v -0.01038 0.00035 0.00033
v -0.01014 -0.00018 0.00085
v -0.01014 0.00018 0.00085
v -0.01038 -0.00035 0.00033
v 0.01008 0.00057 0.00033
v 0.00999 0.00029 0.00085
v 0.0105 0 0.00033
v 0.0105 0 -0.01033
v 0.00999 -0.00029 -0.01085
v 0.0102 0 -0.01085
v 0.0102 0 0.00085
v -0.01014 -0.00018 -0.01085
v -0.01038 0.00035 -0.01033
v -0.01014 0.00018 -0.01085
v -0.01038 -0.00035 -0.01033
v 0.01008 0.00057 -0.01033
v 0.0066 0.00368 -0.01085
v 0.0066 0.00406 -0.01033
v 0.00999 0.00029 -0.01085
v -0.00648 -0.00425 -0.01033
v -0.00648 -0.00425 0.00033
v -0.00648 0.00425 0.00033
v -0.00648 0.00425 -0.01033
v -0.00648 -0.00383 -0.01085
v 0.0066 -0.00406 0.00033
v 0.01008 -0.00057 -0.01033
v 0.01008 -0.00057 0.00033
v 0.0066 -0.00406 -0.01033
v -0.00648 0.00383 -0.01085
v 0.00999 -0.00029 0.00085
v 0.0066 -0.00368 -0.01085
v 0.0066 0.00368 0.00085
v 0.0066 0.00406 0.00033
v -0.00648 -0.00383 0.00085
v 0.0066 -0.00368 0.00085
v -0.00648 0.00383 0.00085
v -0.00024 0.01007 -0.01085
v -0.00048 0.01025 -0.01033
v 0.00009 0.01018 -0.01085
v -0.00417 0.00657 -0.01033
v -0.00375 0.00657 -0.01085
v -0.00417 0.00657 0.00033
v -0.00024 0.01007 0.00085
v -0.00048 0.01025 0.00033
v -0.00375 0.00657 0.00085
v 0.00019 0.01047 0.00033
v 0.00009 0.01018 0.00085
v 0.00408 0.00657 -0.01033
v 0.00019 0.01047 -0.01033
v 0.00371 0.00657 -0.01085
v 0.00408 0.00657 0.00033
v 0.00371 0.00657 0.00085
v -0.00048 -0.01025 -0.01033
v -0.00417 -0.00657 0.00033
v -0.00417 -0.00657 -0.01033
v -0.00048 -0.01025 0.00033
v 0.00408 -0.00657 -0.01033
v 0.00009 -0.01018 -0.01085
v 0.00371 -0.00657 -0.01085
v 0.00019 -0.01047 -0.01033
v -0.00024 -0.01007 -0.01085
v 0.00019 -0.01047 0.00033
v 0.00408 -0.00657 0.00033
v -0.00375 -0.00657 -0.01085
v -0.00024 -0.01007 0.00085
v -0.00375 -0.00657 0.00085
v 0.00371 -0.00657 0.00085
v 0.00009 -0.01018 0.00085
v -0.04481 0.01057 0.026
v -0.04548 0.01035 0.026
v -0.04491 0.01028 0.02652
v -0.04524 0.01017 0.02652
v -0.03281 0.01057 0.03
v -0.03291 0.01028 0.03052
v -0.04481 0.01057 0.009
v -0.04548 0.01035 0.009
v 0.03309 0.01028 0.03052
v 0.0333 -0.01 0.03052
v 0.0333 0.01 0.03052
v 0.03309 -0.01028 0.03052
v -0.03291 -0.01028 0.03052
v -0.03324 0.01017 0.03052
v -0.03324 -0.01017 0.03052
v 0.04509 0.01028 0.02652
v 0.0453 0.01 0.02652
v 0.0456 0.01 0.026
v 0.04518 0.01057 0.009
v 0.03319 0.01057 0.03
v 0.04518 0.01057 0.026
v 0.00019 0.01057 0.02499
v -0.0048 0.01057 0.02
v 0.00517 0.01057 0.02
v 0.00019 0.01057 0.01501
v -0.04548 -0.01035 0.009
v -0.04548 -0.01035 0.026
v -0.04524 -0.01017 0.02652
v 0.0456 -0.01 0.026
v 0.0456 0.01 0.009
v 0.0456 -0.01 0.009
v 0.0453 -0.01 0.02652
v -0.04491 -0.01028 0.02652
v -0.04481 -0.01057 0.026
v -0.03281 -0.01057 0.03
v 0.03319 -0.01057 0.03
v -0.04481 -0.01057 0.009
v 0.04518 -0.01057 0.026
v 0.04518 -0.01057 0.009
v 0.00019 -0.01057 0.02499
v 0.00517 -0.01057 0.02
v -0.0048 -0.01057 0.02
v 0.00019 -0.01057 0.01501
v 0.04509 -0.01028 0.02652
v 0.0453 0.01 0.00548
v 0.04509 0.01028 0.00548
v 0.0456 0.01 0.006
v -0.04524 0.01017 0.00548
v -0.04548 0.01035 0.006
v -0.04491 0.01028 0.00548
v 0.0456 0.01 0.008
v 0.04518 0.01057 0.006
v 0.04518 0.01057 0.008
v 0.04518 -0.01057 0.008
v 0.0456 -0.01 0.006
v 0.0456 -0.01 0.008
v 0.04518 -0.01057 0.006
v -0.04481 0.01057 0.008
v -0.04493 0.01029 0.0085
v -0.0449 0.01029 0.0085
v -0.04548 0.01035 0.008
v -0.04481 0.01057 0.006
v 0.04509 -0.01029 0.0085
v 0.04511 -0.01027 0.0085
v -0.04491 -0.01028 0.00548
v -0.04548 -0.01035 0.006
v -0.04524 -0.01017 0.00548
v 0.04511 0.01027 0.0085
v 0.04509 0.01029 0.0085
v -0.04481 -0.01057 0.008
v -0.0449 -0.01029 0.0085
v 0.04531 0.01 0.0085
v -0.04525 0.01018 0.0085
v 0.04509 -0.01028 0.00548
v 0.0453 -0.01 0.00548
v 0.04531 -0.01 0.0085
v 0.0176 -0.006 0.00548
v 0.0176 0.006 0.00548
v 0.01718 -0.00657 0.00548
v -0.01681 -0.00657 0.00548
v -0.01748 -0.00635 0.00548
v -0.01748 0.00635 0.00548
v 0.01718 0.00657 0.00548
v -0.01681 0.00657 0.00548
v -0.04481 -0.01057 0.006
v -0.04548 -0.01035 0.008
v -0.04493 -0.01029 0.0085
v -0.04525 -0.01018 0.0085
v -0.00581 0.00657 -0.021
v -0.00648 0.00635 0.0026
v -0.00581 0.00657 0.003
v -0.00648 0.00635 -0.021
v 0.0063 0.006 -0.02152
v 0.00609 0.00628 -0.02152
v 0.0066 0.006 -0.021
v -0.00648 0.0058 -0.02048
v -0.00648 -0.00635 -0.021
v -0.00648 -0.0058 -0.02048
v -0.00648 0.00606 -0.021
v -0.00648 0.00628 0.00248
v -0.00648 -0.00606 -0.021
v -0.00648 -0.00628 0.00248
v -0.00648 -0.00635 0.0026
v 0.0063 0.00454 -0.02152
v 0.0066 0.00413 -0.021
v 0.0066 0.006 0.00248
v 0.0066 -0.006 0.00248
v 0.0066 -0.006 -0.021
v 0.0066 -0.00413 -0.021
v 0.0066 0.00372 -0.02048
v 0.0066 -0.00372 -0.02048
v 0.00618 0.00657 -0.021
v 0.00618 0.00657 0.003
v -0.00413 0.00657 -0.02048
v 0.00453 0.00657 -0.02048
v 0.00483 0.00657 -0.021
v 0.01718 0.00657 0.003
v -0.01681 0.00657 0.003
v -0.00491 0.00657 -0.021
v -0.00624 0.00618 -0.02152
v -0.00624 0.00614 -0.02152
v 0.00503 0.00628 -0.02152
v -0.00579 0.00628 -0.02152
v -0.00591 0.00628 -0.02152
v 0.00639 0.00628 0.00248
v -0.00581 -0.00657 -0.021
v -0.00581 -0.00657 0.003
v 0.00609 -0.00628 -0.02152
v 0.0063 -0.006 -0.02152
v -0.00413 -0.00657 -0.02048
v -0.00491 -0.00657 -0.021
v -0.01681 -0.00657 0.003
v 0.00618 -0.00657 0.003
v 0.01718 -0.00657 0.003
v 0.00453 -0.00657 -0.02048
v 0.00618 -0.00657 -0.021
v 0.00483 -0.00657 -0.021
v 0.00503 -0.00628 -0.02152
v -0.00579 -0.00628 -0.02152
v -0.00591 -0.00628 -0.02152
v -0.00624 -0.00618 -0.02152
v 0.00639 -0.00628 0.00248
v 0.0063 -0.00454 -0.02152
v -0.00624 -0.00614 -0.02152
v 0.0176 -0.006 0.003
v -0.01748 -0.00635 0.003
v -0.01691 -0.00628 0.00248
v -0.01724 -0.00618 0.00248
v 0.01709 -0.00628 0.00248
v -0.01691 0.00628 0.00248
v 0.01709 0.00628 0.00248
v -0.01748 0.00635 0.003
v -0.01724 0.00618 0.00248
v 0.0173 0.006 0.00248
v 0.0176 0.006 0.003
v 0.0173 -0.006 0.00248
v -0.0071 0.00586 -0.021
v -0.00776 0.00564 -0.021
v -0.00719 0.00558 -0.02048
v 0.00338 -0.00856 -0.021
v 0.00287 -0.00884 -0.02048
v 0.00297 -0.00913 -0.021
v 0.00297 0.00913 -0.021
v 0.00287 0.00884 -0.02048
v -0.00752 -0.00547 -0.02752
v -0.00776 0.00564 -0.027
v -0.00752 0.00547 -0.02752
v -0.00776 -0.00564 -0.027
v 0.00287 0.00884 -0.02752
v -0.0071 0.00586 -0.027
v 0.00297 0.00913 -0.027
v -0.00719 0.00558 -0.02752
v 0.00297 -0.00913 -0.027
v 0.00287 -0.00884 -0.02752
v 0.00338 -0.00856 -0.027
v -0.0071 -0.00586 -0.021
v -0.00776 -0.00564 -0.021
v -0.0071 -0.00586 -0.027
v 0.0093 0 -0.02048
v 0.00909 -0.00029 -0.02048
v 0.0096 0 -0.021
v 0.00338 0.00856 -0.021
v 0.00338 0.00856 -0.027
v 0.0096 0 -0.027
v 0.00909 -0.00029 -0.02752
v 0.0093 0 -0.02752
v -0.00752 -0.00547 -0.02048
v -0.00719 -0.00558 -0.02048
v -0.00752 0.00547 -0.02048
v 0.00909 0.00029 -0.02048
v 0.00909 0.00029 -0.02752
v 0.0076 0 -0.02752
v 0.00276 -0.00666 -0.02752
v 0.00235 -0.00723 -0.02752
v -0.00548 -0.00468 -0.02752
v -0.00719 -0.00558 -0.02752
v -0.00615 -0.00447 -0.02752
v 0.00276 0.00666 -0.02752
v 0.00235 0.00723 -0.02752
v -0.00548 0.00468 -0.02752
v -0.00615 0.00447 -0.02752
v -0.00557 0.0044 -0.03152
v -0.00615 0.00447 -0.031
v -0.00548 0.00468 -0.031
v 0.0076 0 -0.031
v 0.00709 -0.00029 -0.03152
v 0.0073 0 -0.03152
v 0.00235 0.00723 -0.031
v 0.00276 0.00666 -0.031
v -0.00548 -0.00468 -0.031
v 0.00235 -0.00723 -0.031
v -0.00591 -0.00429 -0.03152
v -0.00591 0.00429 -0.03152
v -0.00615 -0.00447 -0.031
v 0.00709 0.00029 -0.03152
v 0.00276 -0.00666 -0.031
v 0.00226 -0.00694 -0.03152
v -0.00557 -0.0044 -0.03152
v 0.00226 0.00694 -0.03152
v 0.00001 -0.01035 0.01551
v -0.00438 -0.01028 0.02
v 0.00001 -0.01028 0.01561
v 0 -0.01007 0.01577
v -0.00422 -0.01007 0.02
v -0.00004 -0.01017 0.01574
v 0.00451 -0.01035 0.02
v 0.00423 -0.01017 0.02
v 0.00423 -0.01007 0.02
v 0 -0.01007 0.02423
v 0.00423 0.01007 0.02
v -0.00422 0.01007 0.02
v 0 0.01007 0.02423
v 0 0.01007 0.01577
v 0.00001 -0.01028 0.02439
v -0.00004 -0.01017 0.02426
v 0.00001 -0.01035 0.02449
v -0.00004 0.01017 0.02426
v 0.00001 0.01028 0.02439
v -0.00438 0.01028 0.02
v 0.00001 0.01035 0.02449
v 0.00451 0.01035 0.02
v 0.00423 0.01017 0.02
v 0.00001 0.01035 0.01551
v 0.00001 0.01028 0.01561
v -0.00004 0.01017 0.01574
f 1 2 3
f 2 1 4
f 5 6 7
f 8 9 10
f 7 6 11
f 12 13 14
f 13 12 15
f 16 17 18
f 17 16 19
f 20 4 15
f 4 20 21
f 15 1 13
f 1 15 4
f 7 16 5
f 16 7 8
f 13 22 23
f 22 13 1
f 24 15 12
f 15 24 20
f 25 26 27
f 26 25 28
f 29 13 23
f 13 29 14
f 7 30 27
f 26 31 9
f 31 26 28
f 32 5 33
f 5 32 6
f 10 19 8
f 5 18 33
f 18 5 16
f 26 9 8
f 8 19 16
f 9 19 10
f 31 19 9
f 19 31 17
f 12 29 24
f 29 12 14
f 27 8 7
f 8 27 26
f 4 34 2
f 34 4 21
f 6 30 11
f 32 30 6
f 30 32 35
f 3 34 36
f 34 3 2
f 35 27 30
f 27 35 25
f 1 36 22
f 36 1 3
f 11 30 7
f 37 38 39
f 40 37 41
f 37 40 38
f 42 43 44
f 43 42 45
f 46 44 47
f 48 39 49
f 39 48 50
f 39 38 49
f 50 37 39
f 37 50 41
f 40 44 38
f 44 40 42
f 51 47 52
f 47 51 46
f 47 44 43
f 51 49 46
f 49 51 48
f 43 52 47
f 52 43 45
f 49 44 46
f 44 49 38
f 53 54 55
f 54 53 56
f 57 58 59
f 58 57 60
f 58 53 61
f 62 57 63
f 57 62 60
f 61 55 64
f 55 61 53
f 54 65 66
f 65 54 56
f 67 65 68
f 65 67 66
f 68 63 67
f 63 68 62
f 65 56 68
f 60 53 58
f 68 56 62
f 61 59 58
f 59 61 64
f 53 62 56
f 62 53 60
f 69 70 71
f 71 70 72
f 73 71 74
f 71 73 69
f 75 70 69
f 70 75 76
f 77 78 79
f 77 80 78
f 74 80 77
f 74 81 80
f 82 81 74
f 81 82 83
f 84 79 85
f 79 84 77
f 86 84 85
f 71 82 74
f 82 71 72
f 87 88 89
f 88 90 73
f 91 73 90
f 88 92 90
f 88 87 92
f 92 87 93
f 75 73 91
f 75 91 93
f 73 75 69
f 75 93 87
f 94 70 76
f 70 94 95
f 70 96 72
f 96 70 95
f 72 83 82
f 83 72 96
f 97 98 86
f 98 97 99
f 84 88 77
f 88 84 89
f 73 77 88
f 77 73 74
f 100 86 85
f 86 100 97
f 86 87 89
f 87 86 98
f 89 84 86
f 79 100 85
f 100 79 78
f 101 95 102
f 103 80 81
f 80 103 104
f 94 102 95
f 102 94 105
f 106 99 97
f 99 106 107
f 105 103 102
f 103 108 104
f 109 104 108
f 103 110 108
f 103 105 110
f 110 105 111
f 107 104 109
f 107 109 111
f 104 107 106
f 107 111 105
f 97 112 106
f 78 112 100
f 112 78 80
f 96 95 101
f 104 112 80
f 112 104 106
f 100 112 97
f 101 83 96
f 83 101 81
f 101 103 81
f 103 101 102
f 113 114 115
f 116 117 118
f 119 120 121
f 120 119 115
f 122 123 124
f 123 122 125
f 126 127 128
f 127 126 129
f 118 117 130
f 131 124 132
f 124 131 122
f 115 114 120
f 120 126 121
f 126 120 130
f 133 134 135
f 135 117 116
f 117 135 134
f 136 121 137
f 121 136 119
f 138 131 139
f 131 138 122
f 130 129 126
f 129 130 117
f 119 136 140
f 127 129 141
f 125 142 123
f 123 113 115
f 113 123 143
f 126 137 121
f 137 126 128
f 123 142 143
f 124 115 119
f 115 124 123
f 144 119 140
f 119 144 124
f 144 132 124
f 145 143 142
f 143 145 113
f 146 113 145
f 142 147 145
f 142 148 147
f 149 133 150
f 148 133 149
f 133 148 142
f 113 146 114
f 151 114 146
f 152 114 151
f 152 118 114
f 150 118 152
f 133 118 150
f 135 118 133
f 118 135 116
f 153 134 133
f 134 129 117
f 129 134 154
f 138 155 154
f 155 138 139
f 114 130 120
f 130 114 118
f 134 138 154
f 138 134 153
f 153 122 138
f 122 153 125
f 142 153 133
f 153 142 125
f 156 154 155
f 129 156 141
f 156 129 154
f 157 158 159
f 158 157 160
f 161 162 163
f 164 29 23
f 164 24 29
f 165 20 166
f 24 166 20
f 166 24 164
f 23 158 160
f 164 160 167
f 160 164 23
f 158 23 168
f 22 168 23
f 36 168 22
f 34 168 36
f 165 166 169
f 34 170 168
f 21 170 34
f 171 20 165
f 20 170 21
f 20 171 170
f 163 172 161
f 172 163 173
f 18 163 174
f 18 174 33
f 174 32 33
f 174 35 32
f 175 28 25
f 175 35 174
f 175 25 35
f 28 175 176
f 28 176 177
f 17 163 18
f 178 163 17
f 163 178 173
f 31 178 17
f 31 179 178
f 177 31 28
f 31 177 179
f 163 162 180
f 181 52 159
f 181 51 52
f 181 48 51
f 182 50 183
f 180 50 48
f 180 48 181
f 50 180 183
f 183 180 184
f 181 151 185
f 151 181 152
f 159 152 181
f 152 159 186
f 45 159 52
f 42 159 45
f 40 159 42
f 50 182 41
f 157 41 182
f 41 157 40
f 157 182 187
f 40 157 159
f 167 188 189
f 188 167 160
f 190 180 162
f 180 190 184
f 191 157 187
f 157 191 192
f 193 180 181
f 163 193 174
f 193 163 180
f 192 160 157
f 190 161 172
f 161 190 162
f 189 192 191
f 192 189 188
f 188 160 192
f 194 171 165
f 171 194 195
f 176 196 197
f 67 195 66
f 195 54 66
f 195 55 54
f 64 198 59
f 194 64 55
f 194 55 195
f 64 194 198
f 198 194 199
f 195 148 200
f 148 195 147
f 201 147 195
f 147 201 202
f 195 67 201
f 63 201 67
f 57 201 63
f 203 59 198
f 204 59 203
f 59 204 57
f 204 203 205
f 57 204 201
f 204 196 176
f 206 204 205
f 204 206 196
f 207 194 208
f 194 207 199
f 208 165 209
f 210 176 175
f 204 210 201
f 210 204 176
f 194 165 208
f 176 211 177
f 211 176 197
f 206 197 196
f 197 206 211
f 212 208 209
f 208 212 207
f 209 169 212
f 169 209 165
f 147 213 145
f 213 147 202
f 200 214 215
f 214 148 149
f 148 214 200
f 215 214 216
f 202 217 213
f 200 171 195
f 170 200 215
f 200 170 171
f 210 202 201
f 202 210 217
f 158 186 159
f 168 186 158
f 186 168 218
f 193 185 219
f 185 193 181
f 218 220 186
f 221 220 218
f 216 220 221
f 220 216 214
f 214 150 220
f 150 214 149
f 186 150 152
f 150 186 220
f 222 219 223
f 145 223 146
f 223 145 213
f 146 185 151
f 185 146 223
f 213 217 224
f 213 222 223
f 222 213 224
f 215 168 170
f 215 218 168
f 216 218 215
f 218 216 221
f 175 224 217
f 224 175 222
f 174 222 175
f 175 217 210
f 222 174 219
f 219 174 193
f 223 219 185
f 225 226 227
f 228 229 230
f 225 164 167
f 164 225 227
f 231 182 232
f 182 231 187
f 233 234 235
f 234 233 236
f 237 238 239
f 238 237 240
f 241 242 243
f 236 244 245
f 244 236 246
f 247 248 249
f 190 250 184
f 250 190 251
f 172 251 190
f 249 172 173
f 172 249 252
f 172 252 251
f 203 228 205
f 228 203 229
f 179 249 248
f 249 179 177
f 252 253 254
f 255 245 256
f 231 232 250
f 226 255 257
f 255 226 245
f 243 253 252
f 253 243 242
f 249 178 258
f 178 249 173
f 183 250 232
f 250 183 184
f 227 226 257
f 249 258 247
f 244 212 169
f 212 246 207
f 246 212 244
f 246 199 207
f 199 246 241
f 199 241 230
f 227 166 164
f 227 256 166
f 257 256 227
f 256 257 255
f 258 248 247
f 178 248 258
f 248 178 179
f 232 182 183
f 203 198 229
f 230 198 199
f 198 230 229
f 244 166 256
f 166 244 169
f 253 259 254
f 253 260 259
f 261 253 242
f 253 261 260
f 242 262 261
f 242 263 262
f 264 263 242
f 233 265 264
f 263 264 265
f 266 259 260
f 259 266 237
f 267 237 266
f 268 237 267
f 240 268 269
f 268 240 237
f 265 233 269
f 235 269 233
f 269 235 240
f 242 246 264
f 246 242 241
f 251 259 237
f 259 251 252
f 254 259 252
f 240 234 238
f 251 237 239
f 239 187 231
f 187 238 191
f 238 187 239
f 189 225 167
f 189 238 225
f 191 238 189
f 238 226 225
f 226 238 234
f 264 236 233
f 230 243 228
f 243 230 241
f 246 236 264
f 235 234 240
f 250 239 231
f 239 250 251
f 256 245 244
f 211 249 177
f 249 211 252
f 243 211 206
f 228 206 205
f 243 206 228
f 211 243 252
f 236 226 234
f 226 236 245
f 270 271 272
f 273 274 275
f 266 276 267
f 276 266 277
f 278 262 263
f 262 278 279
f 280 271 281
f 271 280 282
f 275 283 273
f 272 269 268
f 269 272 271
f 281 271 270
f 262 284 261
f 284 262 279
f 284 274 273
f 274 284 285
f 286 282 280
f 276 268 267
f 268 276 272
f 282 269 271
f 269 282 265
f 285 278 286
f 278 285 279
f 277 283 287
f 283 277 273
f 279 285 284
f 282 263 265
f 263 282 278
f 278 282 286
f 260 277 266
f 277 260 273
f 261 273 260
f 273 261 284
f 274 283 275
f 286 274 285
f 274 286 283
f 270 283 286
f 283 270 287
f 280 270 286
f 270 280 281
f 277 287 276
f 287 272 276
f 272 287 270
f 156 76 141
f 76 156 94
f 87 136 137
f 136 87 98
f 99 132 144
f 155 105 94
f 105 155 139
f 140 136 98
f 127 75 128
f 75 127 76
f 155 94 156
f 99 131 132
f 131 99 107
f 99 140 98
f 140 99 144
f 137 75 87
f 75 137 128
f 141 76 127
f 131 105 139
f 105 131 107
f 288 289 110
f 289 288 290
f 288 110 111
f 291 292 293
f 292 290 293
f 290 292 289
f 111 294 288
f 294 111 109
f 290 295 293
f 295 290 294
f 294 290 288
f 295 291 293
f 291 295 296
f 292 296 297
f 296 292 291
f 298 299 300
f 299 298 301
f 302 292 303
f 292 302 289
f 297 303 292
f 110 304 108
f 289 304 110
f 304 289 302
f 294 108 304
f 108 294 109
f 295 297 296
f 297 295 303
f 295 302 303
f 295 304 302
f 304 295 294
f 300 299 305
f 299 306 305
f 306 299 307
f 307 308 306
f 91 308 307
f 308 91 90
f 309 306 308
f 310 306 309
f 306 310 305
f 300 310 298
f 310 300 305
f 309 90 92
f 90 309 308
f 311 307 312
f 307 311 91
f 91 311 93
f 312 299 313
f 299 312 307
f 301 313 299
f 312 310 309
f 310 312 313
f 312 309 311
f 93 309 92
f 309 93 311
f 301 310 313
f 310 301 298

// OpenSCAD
// Parameters
bbox_L = 0.09; //[0.045:0.18:0.001]
bbox_W = 0.02; //[0.01:0.04:0.001]
bbox_H = 0.06; //[0.03:0.12:0.001]
grip_L = 0.09; //[0.045:0.18:0.001]
grip_W = 0.02; //[0.01:0.04:0.001]
grip_H = 0.02; //[0.01:0.04:0.001]
grip_curve_sag = 0.004; //[0.002:0.008:0.0005]
stem_W = 0.012; //[0.006:0.024:0.001]
stem_D = 0.012; //[0.006:0.024:0.001]
stem_H = 0.032; //[0.016:0.064:0.001]
base_flange_D = 0.018; //[0.009:0.036:0.001]
base_flange_H = 0.006; //[0.003:0.012:0.001]
base_cap_D = 0.014; //[0.007:0.028:0.001]
base_cap_H = 0.004; //[0.002:0.008:0.001]
gusset_L = 0.012; //[0.006:0.024:0.001]
gusset_drop = 0.008; //[0.004:0.016:0.001]
diamond_W = 0.01; //[0.005:0.02:0.001]
diamond_H = 0.01; //[0.005:0.02:0.001]
diamond_depth = 0.0015; //[0.0005:0.003:0.0001]
overlap = 0.001; //[0.0005:0.002:0.0001]
chamfer = 0.001; //[0.0005:0.002:0.0001]
micro_fillet_r = 0.0006; //[0.0003:0.0012:0.0001]

// Base Shapes
module grip_bar_center_block() {
  translate([0, 0, bbox_H/2 - grip_H/2])
    cube([grip_L - 2*gusset_L, grip_W, grip_H], center=true);
}

module grip_bar_left_end_block() {
  translate([-(grip_L/2 - gusset_L/2), 0, bbox_H/2 - grip_H/2 - grip_curve_sag])
    cube([gusset_L, grip_W, grip_H], center=true);
}

module grip_bar_right_end_block() {
  translate([(grip_L/2 - gusset_L/2), 0, bbox_H/2 - grip_H/2 - grip_curve_sag])
    cube([gusset_L, grip_W, grip_H], center=true);
}

module vertical_stem() {
  translate([0, 0, bbox_H/2 - grip_H - stem_H/2 + overlap])
    cube([stem_W, stem_D, stem_H], center=true);
}

module flanged_base_cap_flange() {
  translate([0, 0, bbox_H/2 - grip_H - stem_H - base_flange_H/2 + overlap])
    cylinder(r=base_flange_D/2, h=base_flange_H, center=true);
}

module flanged_base_cap_cap() {
  translate([0, 0, bbox_H/2 - grip_H - stem_H - base_flange_H - base_cap_H/2 + overlap])
    cylinder(r=base_cap_D/2, h=base_cap_H, center=true);
}

module stem_to_grip_faceted_gusset_front() {
  translate([0, 0, bbox_H/2 - grip_H - gusset_drop/2 + overlap])
    cube([gusset_L, stem_D, gusset_drop], center=true);
}

module stem_to_grip_faceted_gusset_left() {
  translate([-(stem_W/2 + gusset_L/2 - overlap), 0, bbox_H/2 - grip_H - gusset_drop/2 + overlap])
    cube([gusset_L, stem_D, gusset_drop], center=true);
}

module stem_to_grip_faceted_gusset_right() {
  translate([(stem_W/2 + gusset_L/2 - overlap), 0, bbox_H/2 - grip_H - gusset_drop/2 + overlap])
    cube([gusset_L, stem_D, gusset_drop], center=true);
}

module diamond_side_recess_left() {
  translate([0, -(grip_W/2 - diamond_depth/2 + overlap), bbox_H/2 - grip_H/2])
    rotate([90, 0, 0])
    linear_extrude(height=diamond_depth, center=true)
      polygon(points=[[0, diamond_H/2], [diamond_W/2, 0], [0, -diamond_H/2], [-diamond_W/2, 0]]);
}

module diamond_side_recess_right() {
  translate([0, (grip_W/2 - diamond_depth/2 + overlap), bbox_H/2 - grip_H/2])
    rotate([-90, 0, 0])
    linear_extrude(height=diamond_depth, center=true)
      polygon(points=[[0, diamond_H/2], [diamond_W/2, 0], [0, -diamond_H/2], [-diamond_W/2, 0]]);
}

module edge_chamfers_top_wedge() {
  translate([0, 0, bbox_H/2 - chamfer/2 + overlap])
    cube([grip_L + 2*overlap, grip_W + 2*overlap, chamfer], center=true);
}

module edge_chamfers_bottom_wedge() {
  translate([0, 0, bbox_H/2 - grip_H - chamfer/2 - overlap])
    cube([grip_L + 2*overlap, grip_W + 2*overlap, chamfer], center=true);
}

module extra_faceting_detail() {
  translate([0, 0, bbox_H/2 - grip_H - stem_H/2 + overlap])
    rotate([0, 0, 45])
    cube([stem_W + 2*chamfer, stem_D + 2*chamfer, stem_H/3], center=true);
}

module micro_fillet_approximations_sphere() {
  sphere(r=micro_fillet_r, center=true);
}

// Operations
module grip_curvature_profile() {
  hull() {
    grip_bar_center_block();
    grip_bar_left_end_block();
    grip_bar_right_end_block();
  }
}

module grip_bar() {
  union() {
    grip_curvature_profile();
    grip_bar_center_block();
  }
}

module stem_to_grip_faceted_gussets() {
  union() {
    stem_to_grip_faceted_gusset_front();
    stem_to_grip_faceted_gusset_left();
    stem_to_grip_faceted_gusset_right();
  }
}

module flanged_base_cap() {
  union() {
    flanged_base_cap_flange();
    flanged_base_cap_cap();
  }
}

module t_handle_raw_union() {
  union() {
    grip_bar();
    vertical_stem();
    stem_to_grip_faceted_gussets();
    flanged_base_cap();
    extra_faceting_detail();
  }
}

module t_handle_with_diamond_recesses() {
  difference() {
    t_handle_raw_union();
    diamond_side_recess_left();
    diamond_side_recess_right();
  }
}

module t_handle_with_edge_chamfers() {
  difference() {
    t_handle_with_diamond_recesses();
    edge_chamfers_top_wedge();
    edge_chamfers_bottom_wedge();
  }
}

// Final Output
minkowski() {
  t_handle_with_edge_chamfers();
  micro_fillet_approximations_sphere();
}
